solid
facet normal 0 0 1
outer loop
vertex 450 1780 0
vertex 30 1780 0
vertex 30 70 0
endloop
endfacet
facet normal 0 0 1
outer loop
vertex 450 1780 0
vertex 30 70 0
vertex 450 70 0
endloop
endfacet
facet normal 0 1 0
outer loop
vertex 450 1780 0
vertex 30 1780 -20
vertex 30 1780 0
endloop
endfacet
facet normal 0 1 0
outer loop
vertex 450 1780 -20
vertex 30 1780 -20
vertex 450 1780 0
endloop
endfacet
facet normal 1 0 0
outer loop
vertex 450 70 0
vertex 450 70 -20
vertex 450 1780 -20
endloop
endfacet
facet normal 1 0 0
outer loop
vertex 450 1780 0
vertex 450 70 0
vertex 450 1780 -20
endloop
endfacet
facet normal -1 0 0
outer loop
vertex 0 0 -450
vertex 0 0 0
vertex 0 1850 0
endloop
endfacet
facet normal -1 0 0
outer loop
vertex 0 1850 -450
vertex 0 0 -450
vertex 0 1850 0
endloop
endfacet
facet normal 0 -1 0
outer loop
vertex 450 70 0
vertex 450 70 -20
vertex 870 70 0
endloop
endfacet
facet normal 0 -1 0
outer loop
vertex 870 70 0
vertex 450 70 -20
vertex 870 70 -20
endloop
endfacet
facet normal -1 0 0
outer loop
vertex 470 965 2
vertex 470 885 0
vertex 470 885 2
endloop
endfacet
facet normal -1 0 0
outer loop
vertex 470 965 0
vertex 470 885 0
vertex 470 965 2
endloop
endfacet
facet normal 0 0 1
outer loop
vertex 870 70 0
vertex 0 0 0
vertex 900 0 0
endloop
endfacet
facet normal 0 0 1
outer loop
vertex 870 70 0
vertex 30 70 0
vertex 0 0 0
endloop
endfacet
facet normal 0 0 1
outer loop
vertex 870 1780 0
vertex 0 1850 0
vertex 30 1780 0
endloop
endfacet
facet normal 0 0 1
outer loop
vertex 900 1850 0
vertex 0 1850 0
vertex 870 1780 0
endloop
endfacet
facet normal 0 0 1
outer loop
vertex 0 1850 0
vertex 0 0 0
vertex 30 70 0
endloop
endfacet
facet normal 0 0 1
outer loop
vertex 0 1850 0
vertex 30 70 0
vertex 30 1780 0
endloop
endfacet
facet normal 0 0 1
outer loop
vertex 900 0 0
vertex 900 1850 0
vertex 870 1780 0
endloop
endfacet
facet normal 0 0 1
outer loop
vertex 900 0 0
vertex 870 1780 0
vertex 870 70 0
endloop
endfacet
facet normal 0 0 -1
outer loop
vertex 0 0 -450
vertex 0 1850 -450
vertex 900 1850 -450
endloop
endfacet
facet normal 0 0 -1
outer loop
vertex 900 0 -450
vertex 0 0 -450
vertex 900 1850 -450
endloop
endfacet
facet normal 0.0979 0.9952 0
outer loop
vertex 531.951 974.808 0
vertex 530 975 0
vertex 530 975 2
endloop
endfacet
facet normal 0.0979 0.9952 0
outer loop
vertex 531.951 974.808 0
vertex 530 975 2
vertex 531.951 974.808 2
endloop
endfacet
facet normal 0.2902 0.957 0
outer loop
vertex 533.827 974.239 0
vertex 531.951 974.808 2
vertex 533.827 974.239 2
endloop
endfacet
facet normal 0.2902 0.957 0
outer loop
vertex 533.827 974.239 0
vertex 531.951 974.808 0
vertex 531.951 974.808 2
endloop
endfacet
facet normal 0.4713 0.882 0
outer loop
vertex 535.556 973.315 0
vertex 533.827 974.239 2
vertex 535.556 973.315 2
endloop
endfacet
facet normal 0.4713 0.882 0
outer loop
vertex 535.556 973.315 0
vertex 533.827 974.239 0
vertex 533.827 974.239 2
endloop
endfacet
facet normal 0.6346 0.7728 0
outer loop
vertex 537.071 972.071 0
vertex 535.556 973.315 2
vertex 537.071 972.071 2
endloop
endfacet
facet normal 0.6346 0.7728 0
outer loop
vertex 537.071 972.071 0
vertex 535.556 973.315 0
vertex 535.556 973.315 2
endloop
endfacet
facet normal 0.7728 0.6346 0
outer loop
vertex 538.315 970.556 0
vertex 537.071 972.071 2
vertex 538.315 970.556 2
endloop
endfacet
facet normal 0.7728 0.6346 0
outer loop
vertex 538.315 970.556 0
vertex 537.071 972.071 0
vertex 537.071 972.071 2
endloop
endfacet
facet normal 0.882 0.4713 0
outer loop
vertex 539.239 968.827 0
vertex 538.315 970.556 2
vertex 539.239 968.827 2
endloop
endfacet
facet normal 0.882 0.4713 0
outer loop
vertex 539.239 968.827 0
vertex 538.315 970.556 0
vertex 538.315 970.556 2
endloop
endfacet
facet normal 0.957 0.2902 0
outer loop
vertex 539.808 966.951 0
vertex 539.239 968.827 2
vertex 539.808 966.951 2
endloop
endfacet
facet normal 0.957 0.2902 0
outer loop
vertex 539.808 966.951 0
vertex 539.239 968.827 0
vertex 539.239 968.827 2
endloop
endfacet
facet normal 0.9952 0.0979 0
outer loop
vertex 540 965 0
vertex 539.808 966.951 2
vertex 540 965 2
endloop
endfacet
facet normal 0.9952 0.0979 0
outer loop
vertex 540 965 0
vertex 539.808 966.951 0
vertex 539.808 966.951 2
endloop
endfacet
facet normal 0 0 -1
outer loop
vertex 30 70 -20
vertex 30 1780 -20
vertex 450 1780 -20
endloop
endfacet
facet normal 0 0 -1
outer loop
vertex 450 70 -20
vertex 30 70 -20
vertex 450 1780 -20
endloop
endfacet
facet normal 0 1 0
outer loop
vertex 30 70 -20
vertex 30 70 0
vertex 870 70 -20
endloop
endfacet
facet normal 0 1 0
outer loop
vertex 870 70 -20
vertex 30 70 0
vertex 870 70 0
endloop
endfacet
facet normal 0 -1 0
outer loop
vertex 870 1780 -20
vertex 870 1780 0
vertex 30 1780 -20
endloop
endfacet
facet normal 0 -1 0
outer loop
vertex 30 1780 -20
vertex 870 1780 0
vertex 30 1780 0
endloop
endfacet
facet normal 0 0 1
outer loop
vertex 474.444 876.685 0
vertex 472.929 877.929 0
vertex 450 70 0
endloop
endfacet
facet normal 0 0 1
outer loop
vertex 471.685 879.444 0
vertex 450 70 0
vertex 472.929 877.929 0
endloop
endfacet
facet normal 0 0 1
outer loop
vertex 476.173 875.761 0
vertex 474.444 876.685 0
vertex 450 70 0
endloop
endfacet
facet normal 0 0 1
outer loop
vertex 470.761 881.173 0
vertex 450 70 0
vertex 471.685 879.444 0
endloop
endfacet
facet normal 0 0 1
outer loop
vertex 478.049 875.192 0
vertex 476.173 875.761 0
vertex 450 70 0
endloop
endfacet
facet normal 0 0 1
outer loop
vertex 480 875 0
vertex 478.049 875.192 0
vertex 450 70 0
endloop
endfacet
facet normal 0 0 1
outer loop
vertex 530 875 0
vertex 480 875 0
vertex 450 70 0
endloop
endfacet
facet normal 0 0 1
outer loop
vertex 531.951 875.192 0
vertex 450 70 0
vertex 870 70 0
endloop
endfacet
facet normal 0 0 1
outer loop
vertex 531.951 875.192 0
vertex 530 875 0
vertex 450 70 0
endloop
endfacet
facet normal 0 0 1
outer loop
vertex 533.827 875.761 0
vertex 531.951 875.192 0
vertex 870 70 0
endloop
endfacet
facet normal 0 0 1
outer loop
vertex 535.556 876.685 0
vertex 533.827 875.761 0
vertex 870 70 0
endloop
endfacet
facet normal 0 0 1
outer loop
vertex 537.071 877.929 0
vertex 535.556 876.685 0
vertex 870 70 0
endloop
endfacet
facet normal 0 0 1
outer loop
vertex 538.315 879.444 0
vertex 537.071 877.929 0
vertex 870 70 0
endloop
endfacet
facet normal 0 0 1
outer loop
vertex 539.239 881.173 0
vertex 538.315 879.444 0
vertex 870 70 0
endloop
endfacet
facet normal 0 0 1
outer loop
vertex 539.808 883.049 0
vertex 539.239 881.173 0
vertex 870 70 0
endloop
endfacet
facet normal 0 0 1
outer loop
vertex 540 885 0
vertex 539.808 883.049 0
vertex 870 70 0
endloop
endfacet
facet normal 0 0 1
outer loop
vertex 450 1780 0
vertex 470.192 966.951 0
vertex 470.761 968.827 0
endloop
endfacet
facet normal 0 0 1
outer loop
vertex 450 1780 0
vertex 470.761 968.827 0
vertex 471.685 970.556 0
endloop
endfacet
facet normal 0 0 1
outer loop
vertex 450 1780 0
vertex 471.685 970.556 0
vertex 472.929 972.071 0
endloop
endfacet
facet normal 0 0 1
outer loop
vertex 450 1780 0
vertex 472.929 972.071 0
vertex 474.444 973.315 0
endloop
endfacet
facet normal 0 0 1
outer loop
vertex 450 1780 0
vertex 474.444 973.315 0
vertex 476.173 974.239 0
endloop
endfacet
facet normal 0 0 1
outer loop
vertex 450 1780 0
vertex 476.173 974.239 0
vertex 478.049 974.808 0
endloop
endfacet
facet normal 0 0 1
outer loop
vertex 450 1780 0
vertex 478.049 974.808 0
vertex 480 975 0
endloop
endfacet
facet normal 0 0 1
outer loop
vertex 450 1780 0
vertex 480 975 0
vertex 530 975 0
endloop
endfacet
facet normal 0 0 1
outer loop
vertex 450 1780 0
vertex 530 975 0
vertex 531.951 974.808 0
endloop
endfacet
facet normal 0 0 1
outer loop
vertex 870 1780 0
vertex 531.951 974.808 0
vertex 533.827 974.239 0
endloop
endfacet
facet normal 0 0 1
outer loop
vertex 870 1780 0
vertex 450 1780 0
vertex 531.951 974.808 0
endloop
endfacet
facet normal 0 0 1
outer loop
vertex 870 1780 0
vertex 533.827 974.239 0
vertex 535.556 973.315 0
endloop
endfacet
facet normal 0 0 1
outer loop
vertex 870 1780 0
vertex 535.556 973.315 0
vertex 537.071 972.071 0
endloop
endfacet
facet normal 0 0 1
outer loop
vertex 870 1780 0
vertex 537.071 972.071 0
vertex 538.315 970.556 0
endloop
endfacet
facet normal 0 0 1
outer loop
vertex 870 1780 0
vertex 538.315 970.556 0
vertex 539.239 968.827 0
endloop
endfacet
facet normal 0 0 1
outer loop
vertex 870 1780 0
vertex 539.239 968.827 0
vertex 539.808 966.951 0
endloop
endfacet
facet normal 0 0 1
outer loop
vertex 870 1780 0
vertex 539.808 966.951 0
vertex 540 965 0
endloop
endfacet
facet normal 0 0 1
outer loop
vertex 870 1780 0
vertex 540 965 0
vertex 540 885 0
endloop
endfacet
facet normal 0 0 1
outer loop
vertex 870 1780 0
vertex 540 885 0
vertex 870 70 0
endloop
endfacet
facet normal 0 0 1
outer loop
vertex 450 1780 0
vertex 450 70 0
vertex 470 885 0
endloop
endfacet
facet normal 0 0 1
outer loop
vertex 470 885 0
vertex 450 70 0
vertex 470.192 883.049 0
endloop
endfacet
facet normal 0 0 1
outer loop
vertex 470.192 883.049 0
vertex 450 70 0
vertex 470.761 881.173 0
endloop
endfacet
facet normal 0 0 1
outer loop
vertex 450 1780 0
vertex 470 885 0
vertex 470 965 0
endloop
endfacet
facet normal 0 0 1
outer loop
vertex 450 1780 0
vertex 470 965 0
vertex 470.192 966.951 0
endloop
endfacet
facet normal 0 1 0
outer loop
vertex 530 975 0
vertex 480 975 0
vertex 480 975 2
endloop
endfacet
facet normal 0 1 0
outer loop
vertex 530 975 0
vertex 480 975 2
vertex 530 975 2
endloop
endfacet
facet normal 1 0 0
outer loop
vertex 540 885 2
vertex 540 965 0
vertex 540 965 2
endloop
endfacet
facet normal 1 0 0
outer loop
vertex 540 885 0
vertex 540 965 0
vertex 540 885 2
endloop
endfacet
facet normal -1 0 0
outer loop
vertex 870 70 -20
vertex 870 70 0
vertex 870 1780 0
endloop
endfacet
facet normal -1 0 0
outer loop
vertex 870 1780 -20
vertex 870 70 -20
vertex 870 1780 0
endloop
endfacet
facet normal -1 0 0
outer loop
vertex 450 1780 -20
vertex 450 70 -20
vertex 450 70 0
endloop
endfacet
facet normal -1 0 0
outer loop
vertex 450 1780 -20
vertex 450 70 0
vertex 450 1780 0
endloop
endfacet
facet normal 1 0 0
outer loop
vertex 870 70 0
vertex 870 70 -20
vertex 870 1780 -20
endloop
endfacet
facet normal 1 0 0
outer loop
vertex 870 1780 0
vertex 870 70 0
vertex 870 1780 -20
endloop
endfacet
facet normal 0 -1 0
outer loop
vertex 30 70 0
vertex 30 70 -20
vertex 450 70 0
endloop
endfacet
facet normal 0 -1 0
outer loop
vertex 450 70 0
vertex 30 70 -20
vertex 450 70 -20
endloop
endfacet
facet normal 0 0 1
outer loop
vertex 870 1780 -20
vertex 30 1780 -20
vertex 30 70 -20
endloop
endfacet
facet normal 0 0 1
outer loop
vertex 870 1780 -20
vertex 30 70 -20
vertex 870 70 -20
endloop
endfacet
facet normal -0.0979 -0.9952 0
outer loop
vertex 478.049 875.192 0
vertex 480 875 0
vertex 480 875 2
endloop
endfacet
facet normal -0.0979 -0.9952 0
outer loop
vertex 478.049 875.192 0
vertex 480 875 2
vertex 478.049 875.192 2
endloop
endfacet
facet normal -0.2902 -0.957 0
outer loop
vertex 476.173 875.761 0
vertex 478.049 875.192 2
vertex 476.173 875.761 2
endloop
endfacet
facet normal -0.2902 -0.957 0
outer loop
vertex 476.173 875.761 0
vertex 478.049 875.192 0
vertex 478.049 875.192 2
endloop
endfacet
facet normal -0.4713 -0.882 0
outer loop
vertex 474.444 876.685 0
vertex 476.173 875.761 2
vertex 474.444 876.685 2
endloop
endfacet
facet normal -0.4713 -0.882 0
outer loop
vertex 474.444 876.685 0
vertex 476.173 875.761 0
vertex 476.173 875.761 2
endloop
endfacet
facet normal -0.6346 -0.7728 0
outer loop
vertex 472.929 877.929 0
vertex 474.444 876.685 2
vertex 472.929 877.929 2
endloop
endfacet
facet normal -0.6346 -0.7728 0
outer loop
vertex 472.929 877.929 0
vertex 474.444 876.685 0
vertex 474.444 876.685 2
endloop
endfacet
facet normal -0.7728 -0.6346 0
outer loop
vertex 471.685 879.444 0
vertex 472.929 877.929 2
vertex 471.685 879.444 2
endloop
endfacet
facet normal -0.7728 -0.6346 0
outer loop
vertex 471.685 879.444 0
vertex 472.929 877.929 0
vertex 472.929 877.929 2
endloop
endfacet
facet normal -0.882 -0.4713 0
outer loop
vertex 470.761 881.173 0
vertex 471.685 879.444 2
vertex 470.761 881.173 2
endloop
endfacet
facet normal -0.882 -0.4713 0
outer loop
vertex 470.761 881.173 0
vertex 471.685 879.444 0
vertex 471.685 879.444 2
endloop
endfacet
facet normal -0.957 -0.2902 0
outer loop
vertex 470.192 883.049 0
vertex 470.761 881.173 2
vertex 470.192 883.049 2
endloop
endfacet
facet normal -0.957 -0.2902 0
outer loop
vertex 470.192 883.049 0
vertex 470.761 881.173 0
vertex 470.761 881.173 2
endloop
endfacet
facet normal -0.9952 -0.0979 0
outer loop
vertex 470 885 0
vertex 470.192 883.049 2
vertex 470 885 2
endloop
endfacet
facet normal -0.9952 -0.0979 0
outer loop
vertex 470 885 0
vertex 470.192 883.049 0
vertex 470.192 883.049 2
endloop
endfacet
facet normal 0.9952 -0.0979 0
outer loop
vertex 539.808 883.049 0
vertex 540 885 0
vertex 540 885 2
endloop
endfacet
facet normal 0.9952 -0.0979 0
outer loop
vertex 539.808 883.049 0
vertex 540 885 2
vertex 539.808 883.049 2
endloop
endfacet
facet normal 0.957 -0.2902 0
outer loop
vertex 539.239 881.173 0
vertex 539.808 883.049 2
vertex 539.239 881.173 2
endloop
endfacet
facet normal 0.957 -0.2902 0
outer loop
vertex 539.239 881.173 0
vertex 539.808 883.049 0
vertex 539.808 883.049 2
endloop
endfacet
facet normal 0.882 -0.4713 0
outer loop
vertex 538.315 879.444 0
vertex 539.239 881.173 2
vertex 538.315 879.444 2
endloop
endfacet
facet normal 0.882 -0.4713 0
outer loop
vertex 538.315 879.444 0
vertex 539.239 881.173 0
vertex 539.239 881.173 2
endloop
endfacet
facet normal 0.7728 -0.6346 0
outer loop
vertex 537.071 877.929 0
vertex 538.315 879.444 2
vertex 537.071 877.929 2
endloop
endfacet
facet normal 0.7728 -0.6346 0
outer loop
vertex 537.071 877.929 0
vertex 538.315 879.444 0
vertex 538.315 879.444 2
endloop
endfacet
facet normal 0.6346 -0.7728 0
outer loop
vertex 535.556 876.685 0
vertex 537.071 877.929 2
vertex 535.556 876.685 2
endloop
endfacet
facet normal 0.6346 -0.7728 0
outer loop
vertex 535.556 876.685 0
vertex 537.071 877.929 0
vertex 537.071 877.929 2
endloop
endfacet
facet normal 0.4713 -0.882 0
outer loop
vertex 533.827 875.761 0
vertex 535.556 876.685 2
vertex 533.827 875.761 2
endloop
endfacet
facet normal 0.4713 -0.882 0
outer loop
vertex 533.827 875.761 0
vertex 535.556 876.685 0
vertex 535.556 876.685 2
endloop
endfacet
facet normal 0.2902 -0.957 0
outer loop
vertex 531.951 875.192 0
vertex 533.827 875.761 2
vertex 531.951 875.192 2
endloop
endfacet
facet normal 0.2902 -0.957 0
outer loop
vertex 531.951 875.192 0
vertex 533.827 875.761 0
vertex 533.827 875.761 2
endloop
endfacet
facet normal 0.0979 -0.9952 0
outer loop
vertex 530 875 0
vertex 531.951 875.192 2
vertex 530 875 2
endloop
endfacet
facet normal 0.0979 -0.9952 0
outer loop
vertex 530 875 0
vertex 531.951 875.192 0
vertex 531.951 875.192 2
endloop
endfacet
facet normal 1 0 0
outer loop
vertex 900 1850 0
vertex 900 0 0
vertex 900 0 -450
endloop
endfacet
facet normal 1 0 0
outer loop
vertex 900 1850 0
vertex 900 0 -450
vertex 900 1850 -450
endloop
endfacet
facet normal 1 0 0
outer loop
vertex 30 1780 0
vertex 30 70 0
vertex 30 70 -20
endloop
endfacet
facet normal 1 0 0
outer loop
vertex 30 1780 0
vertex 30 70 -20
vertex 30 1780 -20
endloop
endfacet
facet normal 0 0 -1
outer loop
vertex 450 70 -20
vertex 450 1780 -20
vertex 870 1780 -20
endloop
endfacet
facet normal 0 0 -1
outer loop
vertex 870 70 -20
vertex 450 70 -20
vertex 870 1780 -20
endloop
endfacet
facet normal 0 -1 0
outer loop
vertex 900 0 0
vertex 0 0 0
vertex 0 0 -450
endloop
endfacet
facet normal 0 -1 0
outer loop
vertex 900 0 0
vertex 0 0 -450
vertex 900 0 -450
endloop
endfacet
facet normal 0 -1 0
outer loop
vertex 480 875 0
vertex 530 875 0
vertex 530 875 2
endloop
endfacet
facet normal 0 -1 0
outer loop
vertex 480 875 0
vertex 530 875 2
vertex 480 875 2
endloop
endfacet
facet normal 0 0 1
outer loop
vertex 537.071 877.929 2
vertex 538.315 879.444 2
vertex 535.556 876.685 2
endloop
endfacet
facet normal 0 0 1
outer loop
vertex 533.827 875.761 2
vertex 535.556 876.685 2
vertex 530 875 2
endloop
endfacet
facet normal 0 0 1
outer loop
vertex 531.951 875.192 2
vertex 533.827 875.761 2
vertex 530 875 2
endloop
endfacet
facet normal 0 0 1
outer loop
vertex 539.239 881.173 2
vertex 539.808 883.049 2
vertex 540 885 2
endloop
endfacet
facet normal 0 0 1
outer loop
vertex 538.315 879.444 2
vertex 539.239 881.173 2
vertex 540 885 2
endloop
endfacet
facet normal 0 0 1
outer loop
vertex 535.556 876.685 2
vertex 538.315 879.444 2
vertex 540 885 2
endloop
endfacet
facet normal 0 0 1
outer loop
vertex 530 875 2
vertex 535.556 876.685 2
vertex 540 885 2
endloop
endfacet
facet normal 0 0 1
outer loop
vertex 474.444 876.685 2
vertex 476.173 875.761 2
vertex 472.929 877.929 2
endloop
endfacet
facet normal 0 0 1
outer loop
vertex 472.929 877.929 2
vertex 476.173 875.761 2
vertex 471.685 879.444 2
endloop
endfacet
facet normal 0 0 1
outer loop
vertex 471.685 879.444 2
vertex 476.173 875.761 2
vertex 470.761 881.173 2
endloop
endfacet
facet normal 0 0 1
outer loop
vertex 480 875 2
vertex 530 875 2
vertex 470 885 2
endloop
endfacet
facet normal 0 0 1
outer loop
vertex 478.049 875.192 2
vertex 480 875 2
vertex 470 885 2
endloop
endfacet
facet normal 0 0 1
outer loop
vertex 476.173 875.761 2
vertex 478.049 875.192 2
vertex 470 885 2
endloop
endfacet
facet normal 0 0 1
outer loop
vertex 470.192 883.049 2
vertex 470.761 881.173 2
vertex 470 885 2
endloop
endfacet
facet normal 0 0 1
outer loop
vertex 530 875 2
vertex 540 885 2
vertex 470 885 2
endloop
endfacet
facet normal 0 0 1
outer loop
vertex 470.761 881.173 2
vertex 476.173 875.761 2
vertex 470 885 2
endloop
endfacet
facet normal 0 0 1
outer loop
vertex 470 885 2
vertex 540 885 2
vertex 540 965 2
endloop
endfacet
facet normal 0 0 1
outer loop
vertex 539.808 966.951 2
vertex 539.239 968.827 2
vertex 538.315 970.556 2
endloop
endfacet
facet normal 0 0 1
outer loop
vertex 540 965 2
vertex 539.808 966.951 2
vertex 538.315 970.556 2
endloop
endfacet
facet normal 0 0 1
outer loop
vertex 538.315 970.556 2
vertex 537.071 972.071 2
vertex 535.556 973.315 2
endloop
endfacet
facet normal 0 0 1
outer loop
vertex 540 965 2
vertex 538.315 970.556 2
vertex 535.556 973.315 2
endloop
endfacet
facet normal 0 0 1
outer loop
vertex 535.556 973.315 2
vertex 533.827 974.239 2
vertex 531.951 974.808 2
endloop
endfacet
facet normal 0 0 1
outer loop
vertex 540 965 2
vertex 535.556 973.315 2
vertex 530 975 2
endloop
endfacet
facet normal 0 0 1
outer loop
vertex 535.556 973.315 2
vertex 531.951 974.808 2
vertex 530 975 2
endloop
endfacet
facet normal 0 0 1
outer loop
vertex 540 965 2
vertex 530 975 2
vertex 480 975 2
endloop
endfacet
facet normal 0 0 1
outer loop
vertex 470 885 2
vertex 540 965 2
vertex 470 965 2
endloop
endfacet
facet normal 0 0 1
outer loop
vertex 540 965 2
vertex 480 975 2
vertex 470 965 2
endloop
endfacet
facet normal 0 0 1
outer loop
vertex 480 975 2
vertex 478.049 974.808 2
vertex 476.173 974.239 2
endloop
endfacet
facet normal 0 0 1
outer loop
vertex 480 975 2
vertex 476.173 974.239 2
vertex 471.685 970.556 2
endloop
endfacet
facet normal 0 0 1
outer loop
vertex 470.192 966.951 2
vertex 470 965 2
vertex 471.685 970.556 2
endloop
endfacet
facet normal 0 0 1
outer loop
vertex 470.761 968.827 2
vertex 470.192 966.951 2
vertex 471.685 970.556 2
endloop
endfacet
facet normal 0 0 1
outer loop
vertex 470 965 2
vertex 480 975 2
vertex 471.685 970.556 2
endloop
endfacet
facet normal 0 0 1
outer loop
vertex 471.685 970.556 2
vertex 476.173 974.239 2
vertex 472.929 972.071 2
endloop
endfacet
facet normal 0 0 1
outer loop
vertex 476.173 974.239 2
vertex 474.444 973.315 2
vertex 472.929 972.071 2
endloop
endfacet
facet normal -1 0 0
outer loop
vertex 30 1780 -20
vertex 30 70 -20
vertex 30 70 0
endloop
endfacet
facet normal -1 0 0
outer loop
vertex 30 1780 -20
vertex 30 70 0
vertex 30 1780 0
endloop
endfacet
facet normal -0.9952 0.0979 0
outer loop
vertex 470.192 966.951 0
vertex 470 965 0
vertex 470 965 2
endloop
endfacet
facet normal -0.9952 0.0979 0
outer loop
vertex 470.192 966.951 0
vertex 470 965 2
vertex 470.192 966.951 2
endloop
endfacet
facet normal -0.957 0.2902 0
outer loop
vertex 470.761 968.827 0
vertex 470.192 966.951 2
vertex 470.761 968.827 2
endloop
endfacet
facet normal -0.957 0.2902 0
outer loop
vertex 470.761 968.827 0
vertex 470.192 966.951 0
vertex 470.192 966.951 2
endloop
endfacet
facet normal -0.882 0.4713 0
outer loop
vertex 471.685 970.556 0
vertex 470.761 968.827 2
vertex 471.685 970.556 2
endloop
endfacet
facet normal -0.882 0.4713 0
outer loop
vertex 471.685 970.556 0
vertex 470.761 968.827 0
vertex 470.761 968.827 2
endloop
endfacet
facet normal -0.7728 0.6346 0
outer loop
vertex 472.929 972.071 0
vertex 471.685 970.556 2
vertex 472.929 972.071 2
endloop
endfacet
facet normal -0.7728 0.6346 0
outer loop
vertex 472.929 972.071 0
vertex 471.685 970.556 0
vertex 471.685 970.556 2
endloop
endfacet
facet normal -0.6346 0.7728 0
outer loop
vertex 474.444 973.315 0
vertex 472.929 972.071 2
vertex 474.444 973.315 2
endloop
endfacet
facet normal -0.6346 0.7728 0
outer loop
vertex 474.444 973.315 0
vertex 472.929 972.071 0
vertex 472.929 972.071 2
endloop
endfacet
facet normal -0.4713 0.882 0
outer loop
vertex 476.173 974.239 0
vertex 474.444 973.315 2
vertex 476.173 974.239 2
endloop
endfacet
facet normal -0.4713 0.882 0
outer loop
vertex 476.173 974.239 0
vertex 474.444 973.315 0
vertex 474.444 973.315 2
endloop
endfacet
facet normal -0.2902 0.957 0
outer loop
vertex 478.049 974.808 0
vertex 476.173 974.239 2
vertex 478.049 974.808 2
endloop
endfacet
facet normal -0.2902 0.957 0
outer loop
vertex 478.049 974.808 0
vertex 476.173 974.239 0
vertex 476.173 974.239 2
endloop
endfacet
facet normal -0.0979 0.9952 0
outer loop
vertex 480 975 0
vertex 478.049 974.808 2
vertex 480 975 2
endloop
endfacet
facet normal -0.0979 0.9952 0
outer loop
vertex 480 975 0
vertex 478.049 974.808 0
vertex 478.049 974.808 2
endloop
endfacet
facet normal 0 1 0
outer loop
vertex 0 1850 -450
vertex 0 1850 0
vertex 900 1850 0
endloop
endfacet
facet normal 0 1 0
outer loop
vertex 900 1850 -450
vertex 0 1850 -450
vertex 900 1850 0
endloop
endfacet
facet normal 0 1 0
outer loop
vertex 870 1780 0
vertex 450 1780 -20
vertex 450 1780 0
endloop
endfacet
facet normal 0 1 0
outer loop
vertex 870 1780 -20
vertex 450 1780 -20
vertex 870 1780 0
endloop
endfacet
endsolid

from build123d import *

# Parameters (mm, degrees)
SKETCH1_W           = 900
SKETCH1_H           = 1850
BOSS_EXTRUDE1_DEPTH = 450
SKETCH2_W           = 840
SKETCH2_H           = 1710
CUT_EXTRUDE1_DEPTH  = 20
BOSS_EXTRUDE2_START = -20
SKETCH2_3_W         = 420
SKETCH2_3_H         = 1710
BOSS_EXTRUDE2_DEPTH = 20
BOSS_EXTRUDE3_START = -20
SKETCH2_4_W         = 420
SKETCH2_4_H         = 1710
BOSS_EXTRUDE3_DEPTH = 20
BOSS_EXTRUDE4_DEPTH = 2


with BuildPart() as part:
    # Sketch1 → Boss-Extrude1 (new body)
    with BuildSketch(Plane.XY):
        with Locations((450, 925)):
            Rectangle(SKETCH1_W, SKETCH1_H)
    extrude(amount=-BOSS_EXTRUDE1_DEPTH)

    # Sketch2 → Cut-Extrude1 (cut)
    with BuildSketch(Plane.XY):
        with Locations((450, 925)):
            Rectangle(SKETCH2_W, SKETCH2_H)
    extrude(amount=-CUT_EXTRUDE1_DEPTH, mode=Mode.SUBTRACT)


with BuildPart() as body_2:
    # Sketch2<3> → Boss-Extrude2 (new body)
    with BuildSketch(Plane.XY.offset(BOSS_EXTRUDE2_START)):
        with Locations((240, 925)):
            Rectangle(SKETCH2_3_W, SKETCH2_3_H)
    extrude(amount=BOSS_EXTRUDE2_DEPTH)


with BuildPart() as body_3:
    # Sketch2<4> → Boss-Extrude3 (new body)
    with BuildSketch(Plane.XY.offset(BOSS_EXTRUDE3_START)):
        with Locations((660, 925)):
            Rectangle(SKETCH2_4_W, SKETCH2_4_H)
    extrude(amount=BOSS_EXTRUDE3_DEPTH)

    # Sketch3 → Boss-Extrude4 (add)
    with BuildSketch(Plane.XY):
        with BuildLine():
            Line((480, 975), (530, 975))
            ThreePointArc((530, 975), (537.071067812, 972.071067812), (540, 965))
            Line((540, 965), (540, 885))
            ThreePointArc((540, 885), (537.071067812, 877.928932188), (530, 875))
            Line((530, 875), (480, 875))
            ThreePointArc((480, 875), (472.928932188, 877.928932188), (470, 885))
            Line((470, 885), (470, 965))
            ThreePointArc((470, 965), (472.928932188, 972.071067812), (480, 975))
        make_face()
    extrude(amount=BOSS_EXTRUDE4_DEPTH)


solid = Compound([part.part, body_2.part, body_3.part])
